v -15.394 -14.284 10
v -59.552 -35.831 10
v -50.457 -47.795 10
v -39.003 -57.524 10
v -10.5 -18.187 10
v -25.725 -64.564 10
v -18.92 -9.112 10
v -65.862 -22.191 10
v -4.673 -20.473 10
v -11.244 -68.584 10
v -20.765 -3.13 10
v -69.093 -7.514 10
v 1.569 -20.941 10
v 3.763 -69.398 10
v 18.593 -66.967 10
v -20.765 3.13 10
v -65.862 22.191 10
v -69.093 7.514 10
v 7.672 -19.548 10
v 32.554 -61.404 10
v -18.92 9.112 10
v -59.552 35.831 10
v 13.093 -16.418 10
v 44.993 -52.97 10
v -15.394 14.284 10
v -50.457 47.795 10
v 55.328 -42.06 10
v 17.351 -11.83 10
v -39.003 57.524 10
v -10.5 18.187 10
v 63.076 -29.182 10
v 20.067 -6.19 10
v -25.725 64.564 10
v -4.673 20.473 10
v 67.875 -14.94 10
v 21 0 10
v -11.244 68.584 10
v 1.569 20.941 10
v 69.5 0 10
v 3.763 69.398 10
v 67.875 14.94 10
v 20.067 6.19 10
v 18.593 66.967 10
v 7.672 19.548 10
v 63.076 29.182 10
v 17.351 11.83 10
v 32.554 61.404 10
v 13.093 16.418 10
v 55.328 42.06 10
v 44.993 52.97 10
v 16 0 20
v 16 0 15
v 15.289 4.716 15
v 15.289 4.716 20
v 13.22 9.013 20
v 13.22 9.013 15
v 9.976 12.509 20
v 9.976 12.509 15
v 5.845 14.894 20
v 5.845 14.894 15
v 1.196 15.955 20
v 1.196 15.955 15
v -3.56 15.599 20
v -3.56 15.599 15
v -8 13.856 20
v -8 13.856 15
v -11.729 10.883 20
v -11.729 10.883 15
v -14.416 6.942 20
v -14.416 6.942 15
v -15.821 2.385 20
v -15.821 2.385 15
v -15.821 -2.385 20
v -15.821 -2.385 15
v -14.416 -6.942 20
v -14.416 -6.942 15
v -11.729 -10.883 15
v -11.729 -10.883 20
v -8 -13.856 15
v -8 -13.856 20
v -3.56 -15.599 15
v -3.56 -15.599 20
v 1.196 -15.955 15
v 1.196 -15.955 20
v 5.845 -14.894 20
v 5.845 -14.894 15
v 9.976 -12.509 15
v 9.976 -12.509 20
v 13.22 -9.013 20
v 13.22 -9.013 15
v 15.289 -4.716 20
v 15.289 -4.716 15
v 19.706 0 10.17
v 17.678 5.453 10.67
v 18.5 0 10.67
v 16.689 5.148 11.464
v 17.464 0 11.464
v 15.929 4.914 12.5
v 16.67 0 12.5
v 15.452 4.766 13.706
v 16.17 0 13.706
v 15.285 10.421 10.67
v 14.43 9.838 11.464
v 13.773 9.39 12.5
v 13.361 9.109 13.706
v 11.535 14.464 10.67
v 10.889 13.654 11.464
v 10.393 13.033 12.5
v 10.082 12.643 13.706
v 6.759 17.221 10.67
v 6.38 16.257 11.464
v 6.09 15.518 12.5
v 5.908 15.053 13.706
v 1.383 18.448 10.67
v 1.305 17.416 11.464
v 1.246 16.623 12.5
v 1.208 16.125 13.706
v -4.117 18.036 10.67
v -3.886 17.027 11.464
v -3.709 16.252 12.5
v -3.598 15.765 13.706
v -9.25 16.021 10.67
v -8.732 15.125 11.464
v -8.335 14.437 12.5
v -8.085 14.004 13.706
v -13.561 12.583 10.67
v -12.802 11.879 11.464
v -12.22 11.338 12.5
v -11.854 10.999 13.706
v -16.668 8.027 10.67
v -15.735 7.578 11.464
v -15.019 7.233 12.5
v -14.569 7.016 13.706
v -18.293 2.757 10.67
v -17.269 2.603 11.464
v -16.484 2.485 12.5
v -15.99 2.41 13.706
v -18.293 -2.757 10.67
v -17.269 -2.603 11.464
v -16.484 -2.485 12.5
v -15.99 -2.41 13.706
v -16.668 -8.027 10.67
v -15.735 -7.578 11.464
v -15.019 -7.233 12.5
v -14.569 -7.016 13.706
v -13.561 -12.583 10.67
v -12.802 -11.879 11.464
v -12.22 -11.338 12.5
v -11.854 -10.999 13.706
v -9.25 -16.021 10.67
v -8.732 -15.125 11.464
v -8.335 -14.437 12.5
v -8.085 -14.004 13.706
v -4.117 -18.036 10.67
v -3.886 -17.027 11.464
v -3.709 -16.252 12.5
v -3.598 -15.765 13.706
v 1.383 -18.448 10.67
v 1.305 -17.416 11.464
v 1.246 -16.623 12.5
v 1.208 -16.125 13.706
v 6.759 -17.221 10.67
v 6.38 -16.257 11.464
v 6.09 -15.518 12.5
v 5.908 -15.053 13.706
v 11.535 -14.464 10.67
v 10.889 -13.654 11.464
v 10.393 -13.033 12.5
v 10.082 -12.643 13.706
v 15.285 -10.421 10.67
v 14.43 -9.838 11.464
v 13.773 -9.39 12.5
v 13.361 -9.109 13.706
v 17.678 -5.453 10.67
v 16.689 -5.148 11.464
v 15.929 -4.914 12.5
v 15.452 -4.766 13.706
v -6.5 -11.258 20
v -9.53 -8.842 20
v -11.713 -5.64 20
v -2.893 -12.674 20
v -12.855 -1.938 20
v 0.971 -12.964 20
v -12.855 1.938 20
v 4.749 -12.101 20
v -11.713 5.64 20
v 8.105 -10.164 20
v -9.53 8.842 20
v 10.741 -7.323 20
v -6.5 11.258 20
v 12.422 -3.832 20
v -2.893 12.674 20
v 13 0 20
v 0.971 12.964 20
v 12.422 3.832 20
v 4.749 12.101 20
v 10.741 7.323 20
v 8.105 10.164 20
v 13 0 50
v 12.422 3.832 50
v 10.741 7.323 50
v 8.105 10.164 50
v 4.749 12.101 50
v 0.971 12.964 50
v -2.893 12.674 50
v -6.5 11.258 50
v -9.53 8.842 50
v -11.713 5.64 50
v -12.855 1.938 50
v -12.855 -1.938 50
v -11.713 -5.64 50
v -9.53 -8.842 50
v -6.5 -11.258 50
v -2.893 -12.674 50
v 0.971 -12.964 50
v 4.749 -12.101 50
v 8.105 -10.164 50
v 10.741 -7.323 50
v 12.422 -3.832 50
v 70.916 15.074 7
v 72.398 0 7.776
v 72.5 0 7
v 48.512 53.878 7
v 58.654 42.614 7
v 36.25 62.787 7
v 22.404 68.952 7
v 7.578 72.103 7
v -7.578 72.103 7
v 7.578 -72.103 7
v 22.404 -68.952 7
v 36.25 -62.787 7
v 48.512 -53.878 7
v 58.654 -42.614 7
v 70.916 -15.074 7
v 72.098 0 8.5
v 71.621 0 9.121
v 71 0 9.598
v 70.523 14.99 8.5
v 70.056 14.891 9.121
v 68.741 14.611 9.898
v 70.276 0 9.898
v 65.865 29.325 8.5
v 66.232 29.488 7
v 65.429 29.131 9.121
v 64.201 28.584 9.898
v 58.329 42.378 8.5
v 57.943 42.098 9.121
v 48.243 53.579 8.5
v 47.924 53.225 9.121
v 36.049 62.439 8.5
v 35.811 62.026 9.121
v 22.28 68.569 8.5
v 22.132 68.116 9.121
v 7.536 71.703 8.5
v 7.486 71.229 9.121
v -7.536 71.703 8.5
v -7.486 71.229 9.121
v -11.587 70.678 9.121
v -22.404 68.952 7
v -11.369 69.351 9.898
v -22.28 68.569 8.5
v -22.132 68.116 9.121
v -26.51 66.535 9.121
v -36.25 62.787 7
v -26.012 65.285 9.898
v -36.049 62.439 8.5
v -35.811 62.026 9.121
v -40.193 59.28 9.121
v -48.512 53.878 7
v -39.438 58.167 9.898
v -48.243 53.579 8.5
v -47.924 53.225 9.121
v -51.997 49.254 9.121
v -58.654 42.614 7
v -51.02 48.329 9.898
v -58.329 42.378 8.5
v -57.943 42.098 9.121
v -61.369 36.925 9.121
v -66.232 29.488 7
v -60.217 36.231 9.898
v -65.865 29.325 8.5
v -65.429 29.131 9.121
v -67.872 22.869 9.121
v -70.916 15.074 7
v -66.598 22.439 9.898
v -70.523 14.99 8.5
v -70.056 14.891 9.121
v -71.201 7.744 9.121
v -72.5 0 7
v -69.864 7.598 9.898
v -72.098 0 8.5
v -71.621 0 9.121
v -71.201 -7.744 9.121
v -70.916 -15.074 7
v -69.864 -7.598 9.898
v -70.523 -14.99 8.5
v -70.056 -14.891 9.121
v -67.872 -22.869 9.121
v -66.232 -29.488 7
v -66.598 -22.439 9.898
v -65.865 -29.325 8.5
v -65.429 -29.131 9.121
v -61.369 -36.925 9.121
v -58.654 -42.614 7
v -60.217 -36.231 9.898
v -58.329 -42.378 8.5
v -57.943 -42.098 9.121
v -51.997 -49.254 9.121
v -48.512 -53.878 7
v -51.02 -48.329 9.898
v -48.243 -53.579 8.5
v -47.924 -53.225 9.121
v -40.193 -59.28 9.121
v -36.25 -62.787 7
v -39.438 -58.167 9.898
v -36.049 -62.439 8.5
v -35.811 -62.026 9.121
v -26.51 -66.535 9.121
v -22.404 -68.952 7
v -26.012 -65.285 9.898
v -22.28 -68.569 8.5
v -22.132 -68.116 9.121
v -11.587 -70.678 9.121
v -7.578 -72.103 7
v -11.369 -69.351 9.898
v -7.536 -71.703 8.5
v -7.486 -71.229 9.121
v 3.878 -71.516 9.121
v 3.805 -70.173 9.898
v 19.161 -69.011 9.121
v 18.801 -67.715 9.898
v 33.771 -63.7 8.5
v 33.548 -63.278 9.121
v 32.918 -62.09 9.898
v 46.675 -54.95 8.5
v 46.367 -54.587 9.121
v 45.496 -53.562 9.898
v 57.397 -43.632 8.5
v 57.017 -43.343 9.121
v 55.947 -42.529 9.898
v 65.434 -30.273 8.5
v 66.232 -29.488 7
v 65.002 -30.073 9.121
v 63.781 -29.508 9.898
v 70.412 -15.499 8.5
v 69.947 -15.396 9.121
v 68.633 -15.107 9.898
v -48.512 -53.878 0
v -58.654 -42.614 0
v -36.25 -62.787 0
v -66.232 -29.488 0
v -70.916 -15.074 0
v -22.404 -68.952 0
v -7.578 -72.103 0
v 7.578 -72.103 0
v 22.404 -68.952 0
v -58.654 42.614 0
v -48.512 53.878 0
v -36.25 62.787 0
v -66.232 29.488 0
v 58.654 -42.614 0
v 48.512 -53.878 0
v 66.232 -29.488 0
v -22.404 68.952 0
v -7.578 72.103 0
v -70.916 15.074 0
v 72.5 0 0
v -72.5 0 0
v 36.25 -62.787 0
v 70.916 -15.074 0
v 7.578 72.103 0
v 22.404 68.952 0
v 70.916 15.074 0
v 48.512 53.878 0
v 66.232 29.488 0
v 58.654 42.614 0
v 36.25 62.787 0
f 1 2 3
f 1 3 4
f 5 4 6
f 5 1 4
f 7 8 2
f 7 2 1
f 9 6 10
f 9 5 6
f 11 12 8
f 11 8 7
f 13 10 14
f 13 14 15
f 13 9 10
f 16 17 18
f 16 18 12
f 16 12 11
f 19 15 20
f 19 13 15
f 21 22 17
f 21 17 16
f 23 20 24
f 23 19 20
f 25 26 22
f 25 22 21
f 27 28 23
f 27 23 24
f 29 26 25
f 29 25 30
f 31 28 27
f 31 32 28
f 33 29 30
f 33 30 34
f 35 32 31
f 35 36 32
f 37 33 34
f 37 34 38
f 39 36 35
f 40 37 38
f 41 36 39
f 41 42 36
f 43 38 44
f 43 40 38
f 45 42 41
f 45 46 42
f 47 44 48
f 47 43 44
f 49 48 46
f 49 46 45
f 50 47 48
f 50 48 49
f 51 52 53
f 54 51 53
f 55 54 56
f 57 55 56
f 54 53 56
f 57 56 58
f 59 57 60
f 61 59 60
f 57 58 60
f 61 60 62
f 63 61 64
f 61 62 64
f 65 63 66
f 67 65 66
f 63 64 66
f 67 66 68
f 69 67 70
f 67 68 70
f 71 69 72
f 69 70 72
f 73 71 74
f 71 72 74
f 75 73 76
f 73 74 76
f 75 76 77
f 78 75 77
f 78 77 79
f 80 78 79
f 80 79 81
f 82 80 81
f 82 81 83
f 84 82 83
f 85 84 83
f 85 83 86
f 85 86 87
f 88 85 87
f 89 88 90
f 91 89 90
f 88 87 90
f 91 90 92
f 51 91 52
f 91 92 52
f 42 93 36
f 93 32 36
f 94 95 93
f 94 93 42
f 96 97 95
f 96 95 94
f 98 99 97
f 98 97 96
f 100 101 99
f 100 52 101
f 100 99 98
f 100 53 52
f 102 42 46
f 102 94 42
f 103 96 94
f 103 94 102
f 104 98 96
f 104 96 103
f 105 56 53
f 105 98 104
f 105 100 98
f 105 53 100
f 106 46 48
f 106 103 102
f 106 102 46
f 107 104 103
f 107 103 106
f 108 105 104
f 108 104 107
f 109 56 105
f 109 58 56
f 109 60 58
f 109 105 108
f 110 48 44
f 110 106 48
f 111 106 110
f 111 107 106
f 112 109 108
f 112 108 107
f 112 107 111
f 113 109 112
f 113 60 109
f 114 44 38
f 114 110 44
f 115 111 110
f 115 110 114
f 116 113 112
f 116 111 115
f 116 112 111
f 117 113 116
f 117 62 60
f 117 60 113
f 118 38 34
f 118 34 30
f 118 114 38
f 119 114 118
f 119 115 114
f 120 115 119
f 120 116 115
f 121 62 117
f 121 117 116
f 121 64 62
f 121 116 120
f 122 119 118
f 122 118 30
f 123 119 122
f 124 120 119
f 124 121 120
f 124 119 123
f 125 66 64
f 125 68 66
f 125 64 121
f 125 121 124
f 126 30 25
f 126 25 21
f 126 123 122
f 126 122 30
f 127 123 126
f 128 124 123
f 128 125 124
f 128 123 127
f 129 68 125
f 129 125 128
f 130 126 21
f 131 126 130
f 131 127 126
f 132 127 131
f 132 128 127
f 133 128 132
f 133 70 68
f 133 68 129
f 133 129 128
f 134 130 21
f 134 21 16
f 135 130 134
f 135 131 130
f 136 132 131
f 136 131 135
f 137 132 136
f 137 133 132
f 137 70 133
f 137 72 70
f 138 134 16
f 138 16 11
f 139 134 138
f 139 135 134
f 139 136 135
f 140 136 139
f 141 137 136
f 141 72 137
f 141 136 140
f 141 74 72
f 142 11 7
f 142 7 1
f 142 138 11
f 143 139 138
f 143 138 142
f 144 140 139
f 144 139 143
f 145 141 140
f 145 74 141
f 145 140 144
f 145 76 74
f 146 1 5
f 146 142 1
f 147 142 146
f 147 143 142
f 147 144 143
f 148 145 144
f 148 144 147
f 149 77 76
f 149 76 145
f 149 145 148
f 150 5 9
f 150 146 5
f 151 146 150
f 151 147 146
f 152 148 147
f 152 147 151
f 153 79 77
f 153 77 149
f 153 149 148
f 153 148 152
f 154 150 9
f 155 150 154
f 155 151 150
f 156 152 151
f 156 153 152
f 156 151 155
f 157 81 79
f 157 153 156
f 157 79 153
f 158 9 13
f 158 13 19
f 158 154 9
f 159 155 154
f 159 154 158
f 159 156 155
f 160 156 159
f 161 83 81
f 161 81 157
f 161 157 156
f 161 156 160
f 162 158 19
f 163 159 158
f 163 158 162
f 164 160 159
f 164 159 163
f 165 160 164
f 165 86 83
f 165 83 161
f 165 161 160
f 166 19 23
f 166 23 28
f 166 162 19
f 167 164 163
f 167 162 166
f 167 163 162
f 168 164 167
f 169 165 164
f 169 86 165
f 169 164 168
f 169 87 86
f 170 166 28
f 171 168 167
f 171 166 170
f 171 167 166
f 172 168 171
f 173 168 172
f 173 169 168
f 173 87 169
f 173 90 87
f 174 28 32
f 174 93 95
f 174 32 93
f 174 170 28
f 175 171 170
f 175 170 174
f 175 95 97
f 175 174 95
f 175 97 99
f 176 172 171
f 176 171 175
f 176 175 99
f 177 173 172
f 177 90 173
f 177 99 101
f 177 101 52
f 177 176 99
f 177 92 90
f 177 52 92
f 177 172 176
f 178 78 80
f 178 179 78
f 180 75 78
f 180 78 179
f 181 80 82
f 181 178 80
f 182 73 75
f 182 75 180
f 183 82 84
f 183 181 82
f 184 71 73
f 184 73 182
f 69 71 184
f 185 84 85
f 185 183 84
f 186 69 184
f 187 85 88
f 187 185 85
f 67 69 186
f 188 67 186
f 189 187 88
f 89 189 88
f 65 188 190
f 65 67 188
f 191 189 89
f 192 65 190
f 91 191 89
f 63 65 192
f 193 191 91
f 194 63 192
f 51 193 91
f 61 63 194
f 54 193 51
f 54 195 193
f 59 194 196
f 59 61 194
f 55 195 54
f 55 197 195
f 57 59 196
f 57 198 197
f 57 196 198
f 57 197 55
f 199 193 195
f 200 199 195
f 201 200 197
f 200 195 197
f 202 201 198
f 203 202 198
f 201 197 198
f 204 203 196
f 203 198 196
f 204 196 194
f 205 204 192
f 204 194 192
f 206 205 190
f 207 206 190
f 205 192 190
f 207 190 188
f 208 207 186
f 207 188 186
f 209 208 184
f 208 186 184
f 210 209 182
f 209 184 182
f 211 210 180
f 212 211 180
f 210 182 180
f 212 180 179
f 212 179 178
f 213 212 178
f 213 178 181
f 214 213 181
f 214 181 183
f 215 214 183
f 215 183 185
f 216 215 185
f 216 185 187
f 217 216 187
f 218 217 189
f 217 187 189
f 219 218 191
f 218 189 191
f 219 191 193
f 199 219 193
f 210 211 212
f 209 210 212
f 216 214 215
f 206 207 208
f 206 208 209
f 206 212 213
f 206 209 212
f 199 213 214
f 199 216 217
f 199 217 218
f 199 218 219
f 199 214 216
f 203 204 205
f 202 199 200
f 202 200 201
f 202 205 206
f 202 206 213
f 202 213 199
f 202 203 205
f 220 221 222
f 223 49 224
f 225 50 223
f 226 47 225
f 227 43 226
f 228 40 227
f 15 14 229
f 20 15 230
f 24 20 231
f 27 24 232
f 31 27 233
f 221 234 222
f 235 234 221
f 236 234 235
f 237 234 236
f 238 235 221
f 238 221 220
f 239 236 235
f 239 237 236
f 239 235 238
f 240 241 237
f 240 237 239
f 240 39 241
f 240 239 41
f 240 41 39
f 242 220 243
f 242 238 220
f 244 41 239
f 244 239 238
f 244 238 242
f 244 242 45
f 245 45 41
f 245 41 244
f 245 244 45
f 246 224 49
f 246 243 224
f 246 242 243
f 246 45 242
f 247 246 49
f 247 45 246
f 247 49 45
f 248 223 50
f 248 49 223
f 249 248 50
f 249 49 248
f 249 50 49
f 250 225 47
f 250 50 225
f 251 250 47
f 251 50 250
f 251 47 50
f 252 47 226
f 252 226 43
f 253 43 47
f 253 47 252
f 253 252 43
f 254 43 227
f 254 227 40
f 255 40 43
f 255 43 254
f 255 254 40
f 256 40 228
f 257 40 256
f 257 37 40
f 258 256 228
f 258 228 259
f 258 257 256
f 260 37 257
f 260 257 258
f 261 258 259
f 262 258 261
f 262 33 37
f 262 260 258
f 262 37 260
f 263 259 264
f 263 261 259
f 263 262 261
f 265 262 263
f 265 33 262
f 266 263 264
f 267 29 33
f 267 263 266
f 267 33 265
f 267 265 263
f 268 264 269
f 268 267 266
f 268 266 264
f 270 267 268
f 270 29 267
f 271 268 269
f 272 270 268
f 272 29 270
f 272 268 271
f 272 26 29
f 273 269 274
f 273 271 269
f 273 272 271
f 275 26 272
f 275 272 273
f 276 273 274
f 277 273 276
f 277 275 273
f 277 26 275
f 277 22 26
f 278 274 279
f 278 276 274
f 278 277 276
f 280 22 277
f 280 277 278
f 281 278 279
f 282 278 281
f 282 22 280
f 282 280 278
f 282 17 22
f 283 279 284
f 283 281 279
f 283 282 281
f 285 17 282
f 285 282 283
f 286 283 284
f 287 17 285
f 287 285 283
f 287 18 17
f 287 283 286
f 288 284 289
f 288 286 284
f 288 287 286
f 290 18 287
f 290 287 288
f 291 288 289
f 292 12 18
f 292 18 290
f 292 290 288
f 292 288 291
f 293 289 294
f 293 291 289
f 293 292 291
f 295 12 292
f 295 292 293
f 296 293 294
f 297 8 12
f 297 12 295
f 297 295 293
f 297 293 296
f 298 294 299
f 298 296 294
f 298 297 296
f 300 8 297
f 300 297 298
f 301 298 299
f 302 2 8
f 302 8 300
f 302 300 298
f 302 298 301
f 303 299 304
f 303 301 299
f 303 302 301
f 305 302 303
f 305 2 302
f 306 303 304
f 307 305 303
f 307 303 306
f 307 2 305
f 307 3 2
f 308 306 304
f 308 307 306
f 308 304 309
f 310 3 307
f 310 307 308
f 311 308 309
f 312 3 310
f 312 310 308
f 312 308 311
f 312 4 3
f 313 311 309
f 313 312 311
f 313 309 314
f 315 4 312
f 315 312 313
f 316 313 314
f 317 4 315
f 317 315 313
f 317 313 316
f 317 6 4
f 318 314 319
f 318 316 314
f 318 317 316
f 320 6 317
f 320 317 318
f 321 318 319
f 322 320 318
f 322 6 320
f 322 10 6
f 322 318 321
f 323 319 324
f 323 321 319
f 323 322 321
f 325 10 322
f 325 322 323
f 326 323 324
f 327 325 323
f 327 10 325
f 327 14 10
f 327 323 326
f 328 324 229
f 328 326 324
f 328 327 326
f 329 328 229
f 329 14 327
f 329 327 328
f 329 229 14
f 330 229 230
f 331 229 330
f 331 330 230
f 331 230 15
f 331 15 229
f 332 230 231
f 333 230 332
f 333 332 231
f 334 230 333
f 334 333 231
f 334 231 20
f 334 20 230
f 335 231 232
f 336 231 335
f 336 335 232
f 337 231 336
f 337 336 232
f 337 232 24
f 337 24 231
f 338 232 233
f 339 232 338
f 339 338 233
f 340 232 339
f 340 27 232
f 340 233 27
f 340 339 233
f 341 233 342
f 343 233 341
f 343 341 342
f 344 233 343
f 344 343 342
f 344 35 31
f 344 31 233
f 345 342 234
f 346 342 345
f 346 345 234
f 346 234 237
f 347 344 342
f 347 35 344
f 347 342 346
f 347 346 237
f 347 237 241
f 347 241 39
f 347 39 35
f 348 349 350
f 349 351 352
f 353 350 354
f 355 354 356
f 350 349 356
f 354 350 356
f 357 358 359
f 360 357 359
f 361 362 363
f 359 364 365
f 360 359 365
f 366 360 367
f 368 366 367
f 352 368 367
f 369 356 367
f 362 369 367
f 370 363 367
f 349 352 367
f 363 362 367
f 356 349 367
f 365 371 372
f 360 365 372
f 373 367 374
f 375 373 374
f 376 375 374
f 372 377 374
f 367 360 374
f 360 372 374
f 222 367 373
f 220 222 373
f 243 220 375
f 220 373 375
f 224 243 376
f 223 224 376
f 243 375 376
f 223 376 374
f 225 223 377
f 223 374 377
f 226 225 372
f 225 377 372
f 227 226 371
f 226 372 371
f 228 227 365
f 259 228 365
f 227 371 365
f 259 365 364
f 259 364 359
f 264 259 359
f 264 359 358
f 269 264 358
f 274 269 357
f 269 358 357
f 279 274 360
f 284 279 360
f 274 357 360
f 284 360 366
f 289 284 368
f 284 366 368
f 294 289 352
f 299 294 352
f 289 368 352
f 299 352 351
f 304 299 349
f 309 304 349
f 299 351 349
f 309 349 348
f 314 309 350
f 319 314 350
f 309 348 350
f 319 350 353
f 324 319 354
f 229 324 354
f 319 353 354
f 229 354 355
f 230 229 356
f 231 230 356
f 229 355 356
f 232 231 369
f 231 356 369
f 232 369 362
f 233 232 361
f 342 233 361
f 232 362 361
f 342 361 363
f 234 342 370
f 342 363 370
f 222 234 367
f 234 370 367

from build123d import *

# Parameters (mm, degrees)
F0_R     = 72.5
F1_DEPTH = 10
F2_R     = 16
F3_DEPTH = 10
F4_R     = 13
F5_DEPTH = 30
F6_R     = 3
F7_R     = 5


with BuildPart() as f1:
    # F0 (on Top) → F1 (new body)
    with BuildSketch(Plane.XY):
        Circle(F0_R)
    extrude(amount=F1_DEPTH)

    # F2 (on face) → F3 (join)
    with BuildSketch(Plane.XY.offset(10)):
        Circle(F2_R)
    extrude(amount=F3_DEPTH)

    # F4 (on face) → F5 (join)
    with BuildSketch(Plane.XY.offset(20)):
        Circle(F4_R)
    extrude(amount=F5_DEPTH)

    # F6
    f6_edges = [f1.edges().sort_by_distance(p)[0] for p in [
        (-72.5, 0, 10),
    ]]
    fillet(f6_edges, radius=F6_R)

    # F7
    f7_edges = [f1.edges().sort_by_distance(p)[0] for p in [
        (-72.5, 0, 7),
        (-69.5, 0, 10),
        (-16, 0, 10),
    ]]
    fillet(f7_edges, radius=F7_R)


solid = f1.part
